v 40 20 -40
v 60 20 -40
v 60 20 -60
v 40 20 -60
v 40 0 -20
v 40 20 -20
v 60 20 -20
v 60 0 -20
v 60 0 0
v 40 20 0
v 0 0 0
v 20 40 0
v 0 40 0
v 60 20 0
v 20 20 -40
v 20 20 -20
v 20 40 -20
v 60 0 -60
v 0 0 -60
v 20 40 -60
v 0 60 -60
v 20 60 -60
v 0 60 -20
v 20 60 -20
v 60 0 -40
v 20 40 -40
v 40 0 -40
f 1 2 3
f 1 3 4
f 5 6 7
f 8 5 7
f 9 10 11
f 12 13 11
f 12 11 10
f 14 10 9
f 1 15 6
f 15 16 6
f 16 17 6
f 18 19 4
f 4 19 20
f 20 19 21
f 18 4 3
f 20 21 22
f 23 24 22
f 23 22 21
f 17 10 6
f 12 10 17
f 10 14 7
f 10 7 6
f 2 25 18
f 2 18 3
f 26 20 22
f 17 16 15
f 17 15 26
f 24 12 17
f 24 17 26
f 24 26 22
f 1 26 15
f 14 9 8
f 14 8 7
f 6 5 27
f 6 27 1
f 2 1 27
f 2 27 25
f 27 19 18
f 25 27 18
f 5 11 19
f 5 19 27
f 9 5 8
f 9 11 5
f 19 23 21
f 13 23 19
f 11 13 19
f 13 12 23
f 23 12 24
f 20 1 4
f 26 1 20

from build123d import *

# Parameters (mm, degrees)
SALIENTE_EXTRUIR1_DEPTH = 60
CORTAR_EXTRUIR1_DEPTH   = 20
CROQUIS6_W              = 20
CROQUIS6_H              = 20
CORTAR_EXTRUIR3_DEPTH   = 10


with BuildPart() as part:
    # Croquis3 → Saliente-Extruir1 (new body)
    with BuildSketch(Plane.XY):
        Polygon((0, 0), (60, 0), (60, 20), (40, 20), (20, 40), (20, 60), (0, 60), align=None)
    extrude(amount=-SALIENTE_EXTRUIR1_DEPTH)

    # Croquis4 → Cortar-Extruir1 (cut)
    with BuildSketch(Plane(origin=(20, 0, 0), x_dir=(0, 0, -1), z_dir=(1, 0, 0))):
        Polygon((0, 40), (20, 60), (0, 60), align=None)
    extrude(amount=-CORTAR_EXTRUIR1_DEPTH, mode=Mode.SUBTRACT)

    # Croquis6 → Cortar-Extruir3 (cut, symmetric)
    with BuildSketch(Plane.XY.offset(-30)):
        Polygon((20, 40), (20, 20), (40, 20), align=None)
        with Locations((50, 10)):
            Rectangle(CROQUIS6_W, CROQUIS6_H)
    extrude(amount=CORTAR_EXTRUIR3_DEPTH, both=True, mode=Mode.SUBTRACT)


solid = part.part
